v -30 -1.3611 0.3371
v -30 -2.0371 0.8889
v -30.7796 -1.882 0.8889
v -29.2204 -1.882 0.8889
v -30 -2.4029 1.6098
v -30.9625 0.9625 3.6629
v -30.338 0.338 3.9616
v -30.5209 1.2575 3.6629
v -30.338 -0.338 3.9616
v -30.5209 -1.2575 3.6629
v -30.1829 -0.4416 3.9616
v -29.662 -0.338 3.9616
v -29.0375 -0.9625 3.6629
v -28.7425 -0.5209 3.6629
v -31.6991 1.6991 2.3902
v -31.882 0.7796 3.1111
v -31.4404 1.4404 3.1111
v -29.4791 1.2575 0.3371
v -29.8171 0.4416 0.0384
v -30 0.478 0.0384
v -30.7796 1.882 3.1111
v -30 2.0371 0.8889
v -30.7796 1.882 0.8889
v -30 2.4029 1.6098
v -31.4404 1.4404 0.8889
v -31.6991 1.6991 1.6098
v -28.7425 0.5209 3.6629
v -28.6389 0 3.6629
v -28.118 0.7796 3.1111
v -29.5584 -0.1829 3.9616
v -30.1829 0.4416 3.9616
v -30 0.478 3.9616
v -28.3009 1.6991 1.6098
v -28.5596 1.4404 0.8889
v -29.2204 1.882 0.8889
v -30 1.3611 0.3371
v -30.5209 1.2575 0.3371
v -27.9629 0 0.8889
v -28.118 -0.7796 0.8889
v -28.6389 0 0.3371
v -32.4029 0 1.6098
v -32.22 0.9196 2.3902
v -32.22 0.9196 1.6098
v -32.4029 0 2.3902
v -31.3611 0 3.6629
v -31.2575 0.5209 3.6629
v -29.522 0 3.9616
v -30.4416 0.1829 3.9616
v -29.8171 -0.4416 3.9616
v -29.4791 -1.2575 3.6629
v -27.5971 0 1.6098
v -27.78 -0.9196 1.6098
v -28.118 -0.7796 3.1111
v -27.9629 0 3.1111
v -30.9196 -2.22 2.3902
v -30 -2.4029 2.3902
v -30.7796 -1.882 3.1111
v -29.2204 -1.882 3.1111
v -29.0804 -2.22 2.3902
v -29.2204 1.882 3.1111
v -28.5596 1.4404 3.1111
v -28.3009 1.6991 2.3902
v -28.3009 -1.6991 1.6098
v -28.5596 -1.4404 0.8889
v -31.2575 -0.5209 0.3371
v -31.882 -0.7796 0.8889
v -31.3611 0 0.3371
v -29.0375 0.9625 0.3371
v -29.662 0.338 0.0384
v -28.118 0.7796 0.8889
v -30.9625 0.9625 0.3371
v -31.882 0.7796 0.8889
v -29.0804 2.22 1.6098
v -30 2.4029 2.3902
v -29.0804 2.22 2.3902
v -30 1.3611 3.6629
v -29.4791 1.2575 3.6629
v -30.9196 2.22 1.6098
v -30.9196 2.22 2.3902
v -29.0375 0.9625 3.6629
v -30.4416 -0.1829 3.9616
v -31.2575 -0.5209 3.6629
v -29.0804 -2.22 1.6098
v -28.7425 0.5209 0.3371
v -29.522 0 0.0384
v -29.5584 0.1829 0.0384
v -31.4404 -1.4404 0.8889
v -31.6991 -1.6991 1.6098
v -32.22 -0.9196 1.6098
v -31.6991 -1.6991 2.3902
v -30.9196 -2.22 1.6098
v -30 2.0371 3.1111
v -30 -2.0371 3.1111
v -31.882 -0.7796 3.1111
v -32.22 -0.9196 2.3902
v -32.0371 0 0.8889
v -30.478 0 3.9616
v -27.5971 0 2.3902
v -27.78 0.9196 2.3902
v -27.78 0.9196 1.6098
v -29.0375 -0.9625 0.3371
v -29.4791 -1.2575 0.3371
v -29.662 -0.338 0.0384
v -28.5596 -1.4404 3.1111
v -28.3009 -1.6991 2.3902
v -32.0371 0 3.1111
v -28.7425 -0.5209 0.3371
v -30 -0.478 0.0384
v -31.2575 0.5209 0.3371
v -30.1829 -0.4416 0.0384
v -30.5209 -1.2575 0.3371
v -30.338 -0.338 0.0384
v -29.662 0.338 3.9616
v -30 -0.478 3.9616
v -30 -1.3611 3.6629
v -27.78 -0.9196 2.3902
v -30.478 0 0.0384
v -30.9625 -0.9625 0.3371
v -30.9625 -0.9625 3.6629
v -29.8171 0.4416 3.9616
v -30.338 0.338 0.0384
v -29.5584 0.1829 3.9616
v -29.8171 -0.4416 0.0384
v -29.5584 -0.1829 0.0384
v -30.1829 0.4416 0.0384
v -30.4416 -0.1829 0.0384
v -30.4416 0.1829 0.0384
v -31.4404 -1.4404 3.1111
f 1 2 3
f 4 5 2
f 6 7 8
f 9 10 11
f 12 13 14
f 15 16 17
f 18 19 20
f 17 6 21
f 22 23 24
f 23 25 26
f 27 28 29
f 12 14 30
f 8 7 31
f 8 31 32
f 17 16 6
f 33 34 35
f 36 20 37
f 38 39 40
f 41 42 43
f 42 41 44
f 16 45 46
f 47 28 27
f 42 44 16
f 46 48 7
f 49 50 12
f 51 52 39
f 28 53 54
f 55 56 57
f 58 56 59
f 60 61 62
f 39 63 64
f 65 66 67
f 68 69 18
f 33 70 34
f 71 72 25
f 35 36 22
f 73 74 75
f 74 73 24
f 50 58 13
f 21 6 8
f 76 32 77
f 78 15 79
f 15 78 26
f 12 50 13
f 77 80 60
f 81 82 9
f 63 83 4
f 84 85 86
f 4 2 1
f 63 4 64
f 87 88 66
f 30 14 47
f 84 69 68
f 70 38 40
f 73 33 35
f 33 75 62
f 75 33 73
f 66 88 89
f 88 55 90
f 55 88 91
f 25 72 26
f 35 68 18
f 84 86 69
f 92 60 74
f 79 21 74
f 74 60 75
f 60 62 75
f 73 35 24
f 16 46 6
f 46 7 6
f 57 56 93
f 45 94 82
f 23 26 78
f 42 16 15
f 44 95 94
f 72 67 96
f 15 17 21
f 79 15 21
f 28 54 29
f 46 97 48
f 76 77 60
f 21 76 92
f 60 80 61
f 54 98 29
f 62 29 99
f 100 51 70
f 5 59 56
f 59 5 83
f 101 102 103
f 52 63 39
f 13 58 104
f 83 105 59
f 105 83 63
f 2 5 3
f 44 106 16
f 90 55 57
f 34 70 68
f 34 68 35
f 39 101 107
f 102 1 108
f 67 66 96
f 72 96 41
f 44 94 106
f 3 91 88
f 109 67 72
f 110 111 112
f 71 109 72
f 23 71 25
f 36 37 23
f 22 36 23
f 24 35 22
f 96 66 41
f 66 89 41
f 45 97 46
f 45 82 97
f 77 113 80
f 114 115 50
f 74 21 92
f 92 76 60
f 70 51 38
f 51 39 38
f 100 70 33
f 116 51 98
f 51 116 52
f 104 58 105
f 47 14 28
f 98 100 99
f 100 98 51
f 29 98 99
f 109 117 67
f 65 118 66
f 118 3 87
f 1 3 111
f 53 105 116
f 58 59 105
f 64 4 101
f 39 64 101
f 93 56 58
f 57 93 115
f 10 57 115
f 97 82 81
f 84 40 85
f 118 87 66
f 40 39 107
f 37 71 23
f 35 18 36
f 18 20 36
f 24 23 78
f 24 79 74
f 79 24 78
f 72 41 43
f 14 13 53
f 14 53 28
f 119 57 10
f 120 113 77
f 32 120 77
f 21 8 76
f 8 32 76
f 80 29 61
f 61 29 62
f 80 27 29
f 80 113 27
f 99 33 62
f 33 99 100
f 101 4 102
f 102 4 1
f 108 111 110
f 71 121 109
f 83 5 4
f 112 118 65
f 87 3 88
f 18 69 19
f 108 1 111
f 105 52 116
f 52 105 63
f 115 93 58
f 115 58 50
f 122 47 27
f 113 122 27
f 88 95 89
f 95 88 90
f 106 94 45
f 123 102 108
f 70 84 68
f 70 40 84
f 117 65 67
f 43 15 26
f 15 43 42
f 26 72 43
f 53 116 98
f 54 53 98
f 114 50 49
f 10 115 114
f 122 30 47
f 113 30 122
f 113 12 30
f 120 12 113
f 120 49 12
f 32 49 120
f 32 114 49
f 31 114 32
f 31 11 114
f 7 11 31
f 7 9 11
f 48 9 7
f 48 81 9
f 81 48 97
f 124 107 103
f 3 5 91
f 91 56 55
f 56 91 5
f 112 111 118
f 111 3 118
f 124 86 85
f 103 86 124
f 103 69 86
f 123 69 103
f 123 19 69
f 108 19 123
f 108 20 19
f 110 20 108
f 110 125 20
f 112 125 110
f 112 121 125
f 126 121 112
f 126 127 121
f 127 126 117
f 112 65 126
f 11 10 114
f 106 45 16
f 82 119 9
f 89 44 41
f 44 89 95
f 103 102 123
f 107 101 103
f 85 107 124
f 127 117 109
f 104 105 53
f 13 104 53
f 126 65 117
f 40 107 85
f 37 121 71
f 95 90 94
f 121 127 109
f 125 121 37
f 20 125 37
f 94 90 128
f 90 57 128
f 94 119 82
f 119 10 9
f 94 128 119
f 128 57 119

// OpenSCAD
doBatteryPart = true;
doLedPart = true;
doLedCutout = true;
doVersionNr = false;


rotZ = 90;

dxfFileName = "MS3000_case_V220.dxf";
topH=1.2;


glassH = 0.6;
bottomH=2;

logoH = 0.5;



buttonPos = [ 40, 50, 60];
buttonR = 5;
buttonH = 6;

cutoutH = bottomH - glassH; // 1.6;
pcbClearance = 0.45;
pcbH=1.6;
buttonH = 4;

usbH = 0;

ledPartH = 6.9;
batteryPartH= 3.7;
snapInH = 1;
snapInW = 0.8;
delta = 0.40;
//holeH=2;

pillarR=1+1.92;

$fn = 24;
//$fn=8;

infSize = 400;


// -0.1 so we dont press onto the board too much
pillarH= ledPartH + batteryPartH - (bottomH + pcbH - snapInH) - 0.1;
wallOffset = pcbClearance+2*snapInW+delta;

pcbHeight = 24.2;

cylYOffset = pcbHeight/2;
cylPositions = [
  [18.0825, 22.6 - cylYOffset],
 [16.8275, 1.6 - cylYOffset],
 [97.8, 22.6 - cylYOffset],
 [97.8, 1.6 - cylYOffset],
];

cCS = 10;
cOO = 1;
cDD = 1.7;
cylCutawayParams = [
 [[1, [0, 0, 0], [0, -(cCS/2+cOO), cCS/2-cDD]]
 //, [1, [0, 0, 0], [6, 3-(cCS/2+cOO), cCS/2-cDD-6]]
 ],
 [[1, [0, 0, 0],  [0, cCS/2+cOO, cCS/2-cDD]]],
 [[0]],
 [[1, [0, 0, 0], , [0, cCS/2+cOO, cCS/2-cDD]]],
];
smallButtonPositions = [
    [32.7025, 21.14],
    [3.06, 5.08],
];

bbY = 17.3;
bbZ = 6.3;
bbR = 6.0;    
bbRX = 8;
buttonPositions = [
    [39.65, bbY, bbZ],
    [49.65, bbY, bbZ],
    [59.65, bbY, bbZ],
];


rotate([0,0,rotZ]) {
    if (doBatteryPart) 
        translate([0,0, topH]) 
            mirror([0, -1, 0])
                BatteryPart();
    
    if (doLedPart)
        translate([0, doBatteryPart ? 30 : 0, 0])
            LedPart();
}

expl= 0.1;

*intersection() {
rotate([0,0,0]) {
    translate([0,0, bottomH+expl]) 
        linear_extrude(convexity = 10, height = pcbH-expl, center = false)
            import(file = dxfFileName, layer = "pcb", convexity = 10, scale=1);

    
    if (doBatteryPart) 
        translate([0,0, ledPartH + batteryPartH + snapInH + expl]) 
            rotate([180,0,0])
            mirror([0, -1, 0])
                BatteryPart();
    
    if (doLedPart)
        translate([0, 0, 0])
            LedPart();
}
cubeEx([35.5, 100, 100]);
}

module BatteryPart() {
difference() {
union() {
    #intersection() {
     translate([0,0,0]) {
                for (pos = cylPositions) {
			translate([pos[0], pos[1], -1]) {
                cylinder(r=pillarR, h=pillarH+1, center=false);
				cylinder(r1= 8, r2= 0, h = 8, center=false);
			}
		}
      }
      union() {
        translate([0,0,4]) linear_extrude(convexity = 10, height = infSize, center = true)
                //minkowski() {
                import(file = dxfFileName, layer = "pcb", convexity = 10, scale=1);
                //    circle(r=pcbClearance-delta);
                //};
      
           translate([0,0,-infSize/2+batteryPartH]) linear_extrude(convexity = 10, height = infSize, center = true)
                minkowski() {
                import(file = dxfFileName, layer = "pcb", convexity = 10, scale=1);
                    circle(r=1);
                };
      
    }
}

intersection() {
    // pcb um null darauf waende in xyz
    difference()
    {
       minkowski() {
        linear_extrude(convexity = 10, height = batteryPartH, center = false)
                import(file = dxfFileName, layer = "pcb", convexity = 10, scale=1);
        ellipsoid([wallOffset,wallOffset, topH]);
        }
    
    difference() {
        // cutout
        translate([0,0,0]) linear_extrude(convexity = 10, height = infSize, center = false)
                minkowski() {
                    import(file = dxfFileName, layer = "pcb", convexity = 10, scale=1);
                     circle(r=pcbClearance, $fn=16);
                }
        }
        cubeEx([infSize, infSize, infSize], [0, 0, 0.5], [0,0, batteryPartH]);
    }
    
    
     // snapIn
    union() 
    {
      linear_extrude(convexity = 10, height = (batteryPartH-snapInH)*2, center = true)
			minkowski() {
                import(file = dxfFileName, layer = "pcb", convexity = 10, scale=1);
                 circle(r=wallOffset+1, $fn=16);
            };
            
            linear_extrude(convexity = 10, height = (batteryPartH+snapInH)*2, center = true)
                minkowski() {
                    import(file = dxfFileName, layer = "pcb", convexity = 10, scale=1);
                     circle(r=pcbClearance+snapInW, $fn=16);
                }
      }
}
};
cubeEx([6, 4, 10], [0, 0, -0], [4.5,-7, 0]);

     // screwholes and versenkte schraubenkoepfe ;)
		translate([0, 0, -1]) for (pos = cylPositions) {
			translate([pos[0], pos[1], -1]) {
				cylinder(r= 1.50, h = 50, center=true);
				#cylinder(r1= 4.3, r2= 0, h = 4.3, center=false);
			}
		}
        
       # translate([0, 0, 0]) for (pIdx = [0, 1, 2, 3]) {
            paramss = cylCutawayParams[pIdx];
         echo(paramss);
            //params=paramss[0];
        for (params = paramss)
            if (params[0]) {
                pos = cylPositions[pIdx];
                rp = params[1];
                tr = params[2];
                 translate(tr) translate([pos[0], pos[1], pillarH]) rotate(rp) {
                    cubeEx([cCS, cCS, cCS]);
                }
            }
		}
            
                

      //#translate([0,0,-topH]) LogoCutout(doLogo = true, doVNr = doVersionNr);
   
     
     // aux HOLES (reset, power off)B
     union() {
     
     for (pos = smallButtonPositions) {
			translate([pos[0], pos[1]-cylYOffset]) {
				cylinder(r= 1.3, h = 4*infSize, center=true);
			}
		}
    }

 *for (pos = buttonPositions) {
			translate([pos[0], pos[1], 10 - pos[2]])
                ellipsoid([bbRX,bbR,bbR]);      
     } 
     
     translate([0,0,10-2*buttonPositions[0][2]]) ButtonCutout();
}}

module LogoCutout(doLogo, doVNr) {
    
      translate([0,0,0]) {
         linear_extrude(convexity = 10, height = 2*logoH, center = true ) {
                if (doLogo) {
                    import(file = dxfFileName, layer = "logo_magic", convexity = 10, scale=1);
                    import(file = dxfFileName, layer = "logo_shifter", convexity = 10, scale=1);
                }
                if (doVNr) {
                    import(file = dxfFileName, layer = "VersionText", convexity = 10, scale=1);
                    *translate([77, -6  , 0]) circle(r = 1);
                }
            }
        }
    
}

module ButtonCutout() {
     for (pos = buttonPositions) {
        translate(pos) ellipsoid([bbRX,bbR,bbR],$fn=64);      
     }
 }


// led part
module LedPart() {
    difference() {
translate([0, 0, bottomH]) difference()
{
    // pcb um null in bottomH und dann in xyz fuer outher walls
    minkowski() {
        linear_extrude(convexity = 10, height = ledPartH, center = false)
                import(file = dxfFileName, layer = "pcb", convexity = 10, scale=1);
        ellipsoid([wallOffset,wallOffset, bottomH]);
    }
    
    // pcp plus clearance
    translate([0,0,0]) linear_extrude(convexity = 10, height = infSize, center = false)
			minkowski() {
                import(file = dxfFileName, layer = "pcb", convexity = 10, scale=1);
                 circle(r=pcbClearance, $fn=16);
            };

    if (doLedCutout) {
        // ledspace raus
        translate([0,0, glassH-bottomH]) linear_extrude(convexity = 10, height = infSize, center = false)
        
        minkowski() {
                import(file = dxfFileName, layer = "leds", convexity = 10, scale=1);
                    circle(r=1);
                };
    }
            
    // ledspace raus
    translate([0,0, doLedCutout ? -5 : glassH-bottomH]) linear_extrude(convexity = 10, height = infSize, center = false)
			import(file = dxfFileName, layer = "leds", convexity = 10, scale=1);
            
    // space for through hol components
    translate([0,0,-cutoutH])
    linear_extrude(convexity = 10, height = infSize, center = false)
			import(file = dxfFileName, layer = "cutout_solder", convexity = 10, scale=1);
            
     
    ButtonCutout();
            
 
        
     
            
            translate([-infSize/3,0, pcbH+usbH]) rotate([0,0,0]) rotate([90,00,0]) rotate([0,00,90]) rotate([90,90,0]) linear_extrude(convexity = 10, height = infSize, center = true)
			import(file = dxfFileName, layer = "usb", convexity = 10, scale=1);
      
       
   // occams razor ;)    
      cubeEx([infSize, infSize, infSize], [0, 0, 0.5], [0,0, ledPartH]);
         
            
      // snapIn
      translate([0,0,ledPartH-snapInH]) linear_extrude(convexity = 10, height = infSize, center = false)
			minkowski() {
                import(file = dxfFileName, layer = "pcb", convexity = 10, scale=1);
                 circle(r=wallOffset-snapInW, $fn=16);
            }
            
       #for (pos = cylPositions) {
			translate([pos[0], pos[1], -bottomH-0.1]) {
				cylinder(r1= 0.60, r2=1.00, h = bottomH+2*0.1, center=false);
			}
		}
           
            
            
            
}

//#translate([2,16,0]) 
#mirror([0,1,0]) 
#LogoCutout(doLogo = false, doVNr = doVersionNr);

}
}








// my improved version of the openSCAD cube module
// size works like the first parameter of the cube primitive, it's a 3 dim vector that contains the sidelengths of the "cube" ;)
// center is also a 3 dim vector so you can specify the centering for each axis individually, This is normaly either -0.5, 0 (equal to center = true), or 0.5 (equal to center = false) but any value is possible.
// offset specifies an absolute offset in mm from the position that would result from just the center parameter
module cubeEx(size=[1,1,1], center=[0,0,0], offset=[0,0,0], childCenters, childOffsets, unionNotDifference=0)
{
	//s = 1.5;
	//centerExp = [s*center[0], s*center[1], s*center[2]];

	translate([center[0]*size[0]+offset[0], center[1]*size[1]+offset[1], center[2]*size[2]+offset[2]])
	{
		if (!unionNotDifference)
			difference()
			{
				cube(size, center = true);
				if ($children > 0) for (i = [0:$children-1])
					translate([childCenters[i][0]*size[0]+childOffsets[i][0], childCenters[i][1]*size[1]+childOffsets[i][1], childCenters[i][2]*size[2]+childOffsets[i][2]]) child(i);
			}
		if (unionNotDifference)
			union()
			{
				cube(size, center = true);
				if ($children > 0) for (i = [0:$children-1])
					translate([childCenters[i][0]*size[0]+childOffsets[i][0], childCenters[i][1]*size[1]+childOffsets[i][1], childCenters[i][2]*size[2]+childOffsets[i][2]]) child(i);
			}
	}
}


module ellipsoid(v)
{
    scale(v, $fn=16) sphere(r=1);
}


    
